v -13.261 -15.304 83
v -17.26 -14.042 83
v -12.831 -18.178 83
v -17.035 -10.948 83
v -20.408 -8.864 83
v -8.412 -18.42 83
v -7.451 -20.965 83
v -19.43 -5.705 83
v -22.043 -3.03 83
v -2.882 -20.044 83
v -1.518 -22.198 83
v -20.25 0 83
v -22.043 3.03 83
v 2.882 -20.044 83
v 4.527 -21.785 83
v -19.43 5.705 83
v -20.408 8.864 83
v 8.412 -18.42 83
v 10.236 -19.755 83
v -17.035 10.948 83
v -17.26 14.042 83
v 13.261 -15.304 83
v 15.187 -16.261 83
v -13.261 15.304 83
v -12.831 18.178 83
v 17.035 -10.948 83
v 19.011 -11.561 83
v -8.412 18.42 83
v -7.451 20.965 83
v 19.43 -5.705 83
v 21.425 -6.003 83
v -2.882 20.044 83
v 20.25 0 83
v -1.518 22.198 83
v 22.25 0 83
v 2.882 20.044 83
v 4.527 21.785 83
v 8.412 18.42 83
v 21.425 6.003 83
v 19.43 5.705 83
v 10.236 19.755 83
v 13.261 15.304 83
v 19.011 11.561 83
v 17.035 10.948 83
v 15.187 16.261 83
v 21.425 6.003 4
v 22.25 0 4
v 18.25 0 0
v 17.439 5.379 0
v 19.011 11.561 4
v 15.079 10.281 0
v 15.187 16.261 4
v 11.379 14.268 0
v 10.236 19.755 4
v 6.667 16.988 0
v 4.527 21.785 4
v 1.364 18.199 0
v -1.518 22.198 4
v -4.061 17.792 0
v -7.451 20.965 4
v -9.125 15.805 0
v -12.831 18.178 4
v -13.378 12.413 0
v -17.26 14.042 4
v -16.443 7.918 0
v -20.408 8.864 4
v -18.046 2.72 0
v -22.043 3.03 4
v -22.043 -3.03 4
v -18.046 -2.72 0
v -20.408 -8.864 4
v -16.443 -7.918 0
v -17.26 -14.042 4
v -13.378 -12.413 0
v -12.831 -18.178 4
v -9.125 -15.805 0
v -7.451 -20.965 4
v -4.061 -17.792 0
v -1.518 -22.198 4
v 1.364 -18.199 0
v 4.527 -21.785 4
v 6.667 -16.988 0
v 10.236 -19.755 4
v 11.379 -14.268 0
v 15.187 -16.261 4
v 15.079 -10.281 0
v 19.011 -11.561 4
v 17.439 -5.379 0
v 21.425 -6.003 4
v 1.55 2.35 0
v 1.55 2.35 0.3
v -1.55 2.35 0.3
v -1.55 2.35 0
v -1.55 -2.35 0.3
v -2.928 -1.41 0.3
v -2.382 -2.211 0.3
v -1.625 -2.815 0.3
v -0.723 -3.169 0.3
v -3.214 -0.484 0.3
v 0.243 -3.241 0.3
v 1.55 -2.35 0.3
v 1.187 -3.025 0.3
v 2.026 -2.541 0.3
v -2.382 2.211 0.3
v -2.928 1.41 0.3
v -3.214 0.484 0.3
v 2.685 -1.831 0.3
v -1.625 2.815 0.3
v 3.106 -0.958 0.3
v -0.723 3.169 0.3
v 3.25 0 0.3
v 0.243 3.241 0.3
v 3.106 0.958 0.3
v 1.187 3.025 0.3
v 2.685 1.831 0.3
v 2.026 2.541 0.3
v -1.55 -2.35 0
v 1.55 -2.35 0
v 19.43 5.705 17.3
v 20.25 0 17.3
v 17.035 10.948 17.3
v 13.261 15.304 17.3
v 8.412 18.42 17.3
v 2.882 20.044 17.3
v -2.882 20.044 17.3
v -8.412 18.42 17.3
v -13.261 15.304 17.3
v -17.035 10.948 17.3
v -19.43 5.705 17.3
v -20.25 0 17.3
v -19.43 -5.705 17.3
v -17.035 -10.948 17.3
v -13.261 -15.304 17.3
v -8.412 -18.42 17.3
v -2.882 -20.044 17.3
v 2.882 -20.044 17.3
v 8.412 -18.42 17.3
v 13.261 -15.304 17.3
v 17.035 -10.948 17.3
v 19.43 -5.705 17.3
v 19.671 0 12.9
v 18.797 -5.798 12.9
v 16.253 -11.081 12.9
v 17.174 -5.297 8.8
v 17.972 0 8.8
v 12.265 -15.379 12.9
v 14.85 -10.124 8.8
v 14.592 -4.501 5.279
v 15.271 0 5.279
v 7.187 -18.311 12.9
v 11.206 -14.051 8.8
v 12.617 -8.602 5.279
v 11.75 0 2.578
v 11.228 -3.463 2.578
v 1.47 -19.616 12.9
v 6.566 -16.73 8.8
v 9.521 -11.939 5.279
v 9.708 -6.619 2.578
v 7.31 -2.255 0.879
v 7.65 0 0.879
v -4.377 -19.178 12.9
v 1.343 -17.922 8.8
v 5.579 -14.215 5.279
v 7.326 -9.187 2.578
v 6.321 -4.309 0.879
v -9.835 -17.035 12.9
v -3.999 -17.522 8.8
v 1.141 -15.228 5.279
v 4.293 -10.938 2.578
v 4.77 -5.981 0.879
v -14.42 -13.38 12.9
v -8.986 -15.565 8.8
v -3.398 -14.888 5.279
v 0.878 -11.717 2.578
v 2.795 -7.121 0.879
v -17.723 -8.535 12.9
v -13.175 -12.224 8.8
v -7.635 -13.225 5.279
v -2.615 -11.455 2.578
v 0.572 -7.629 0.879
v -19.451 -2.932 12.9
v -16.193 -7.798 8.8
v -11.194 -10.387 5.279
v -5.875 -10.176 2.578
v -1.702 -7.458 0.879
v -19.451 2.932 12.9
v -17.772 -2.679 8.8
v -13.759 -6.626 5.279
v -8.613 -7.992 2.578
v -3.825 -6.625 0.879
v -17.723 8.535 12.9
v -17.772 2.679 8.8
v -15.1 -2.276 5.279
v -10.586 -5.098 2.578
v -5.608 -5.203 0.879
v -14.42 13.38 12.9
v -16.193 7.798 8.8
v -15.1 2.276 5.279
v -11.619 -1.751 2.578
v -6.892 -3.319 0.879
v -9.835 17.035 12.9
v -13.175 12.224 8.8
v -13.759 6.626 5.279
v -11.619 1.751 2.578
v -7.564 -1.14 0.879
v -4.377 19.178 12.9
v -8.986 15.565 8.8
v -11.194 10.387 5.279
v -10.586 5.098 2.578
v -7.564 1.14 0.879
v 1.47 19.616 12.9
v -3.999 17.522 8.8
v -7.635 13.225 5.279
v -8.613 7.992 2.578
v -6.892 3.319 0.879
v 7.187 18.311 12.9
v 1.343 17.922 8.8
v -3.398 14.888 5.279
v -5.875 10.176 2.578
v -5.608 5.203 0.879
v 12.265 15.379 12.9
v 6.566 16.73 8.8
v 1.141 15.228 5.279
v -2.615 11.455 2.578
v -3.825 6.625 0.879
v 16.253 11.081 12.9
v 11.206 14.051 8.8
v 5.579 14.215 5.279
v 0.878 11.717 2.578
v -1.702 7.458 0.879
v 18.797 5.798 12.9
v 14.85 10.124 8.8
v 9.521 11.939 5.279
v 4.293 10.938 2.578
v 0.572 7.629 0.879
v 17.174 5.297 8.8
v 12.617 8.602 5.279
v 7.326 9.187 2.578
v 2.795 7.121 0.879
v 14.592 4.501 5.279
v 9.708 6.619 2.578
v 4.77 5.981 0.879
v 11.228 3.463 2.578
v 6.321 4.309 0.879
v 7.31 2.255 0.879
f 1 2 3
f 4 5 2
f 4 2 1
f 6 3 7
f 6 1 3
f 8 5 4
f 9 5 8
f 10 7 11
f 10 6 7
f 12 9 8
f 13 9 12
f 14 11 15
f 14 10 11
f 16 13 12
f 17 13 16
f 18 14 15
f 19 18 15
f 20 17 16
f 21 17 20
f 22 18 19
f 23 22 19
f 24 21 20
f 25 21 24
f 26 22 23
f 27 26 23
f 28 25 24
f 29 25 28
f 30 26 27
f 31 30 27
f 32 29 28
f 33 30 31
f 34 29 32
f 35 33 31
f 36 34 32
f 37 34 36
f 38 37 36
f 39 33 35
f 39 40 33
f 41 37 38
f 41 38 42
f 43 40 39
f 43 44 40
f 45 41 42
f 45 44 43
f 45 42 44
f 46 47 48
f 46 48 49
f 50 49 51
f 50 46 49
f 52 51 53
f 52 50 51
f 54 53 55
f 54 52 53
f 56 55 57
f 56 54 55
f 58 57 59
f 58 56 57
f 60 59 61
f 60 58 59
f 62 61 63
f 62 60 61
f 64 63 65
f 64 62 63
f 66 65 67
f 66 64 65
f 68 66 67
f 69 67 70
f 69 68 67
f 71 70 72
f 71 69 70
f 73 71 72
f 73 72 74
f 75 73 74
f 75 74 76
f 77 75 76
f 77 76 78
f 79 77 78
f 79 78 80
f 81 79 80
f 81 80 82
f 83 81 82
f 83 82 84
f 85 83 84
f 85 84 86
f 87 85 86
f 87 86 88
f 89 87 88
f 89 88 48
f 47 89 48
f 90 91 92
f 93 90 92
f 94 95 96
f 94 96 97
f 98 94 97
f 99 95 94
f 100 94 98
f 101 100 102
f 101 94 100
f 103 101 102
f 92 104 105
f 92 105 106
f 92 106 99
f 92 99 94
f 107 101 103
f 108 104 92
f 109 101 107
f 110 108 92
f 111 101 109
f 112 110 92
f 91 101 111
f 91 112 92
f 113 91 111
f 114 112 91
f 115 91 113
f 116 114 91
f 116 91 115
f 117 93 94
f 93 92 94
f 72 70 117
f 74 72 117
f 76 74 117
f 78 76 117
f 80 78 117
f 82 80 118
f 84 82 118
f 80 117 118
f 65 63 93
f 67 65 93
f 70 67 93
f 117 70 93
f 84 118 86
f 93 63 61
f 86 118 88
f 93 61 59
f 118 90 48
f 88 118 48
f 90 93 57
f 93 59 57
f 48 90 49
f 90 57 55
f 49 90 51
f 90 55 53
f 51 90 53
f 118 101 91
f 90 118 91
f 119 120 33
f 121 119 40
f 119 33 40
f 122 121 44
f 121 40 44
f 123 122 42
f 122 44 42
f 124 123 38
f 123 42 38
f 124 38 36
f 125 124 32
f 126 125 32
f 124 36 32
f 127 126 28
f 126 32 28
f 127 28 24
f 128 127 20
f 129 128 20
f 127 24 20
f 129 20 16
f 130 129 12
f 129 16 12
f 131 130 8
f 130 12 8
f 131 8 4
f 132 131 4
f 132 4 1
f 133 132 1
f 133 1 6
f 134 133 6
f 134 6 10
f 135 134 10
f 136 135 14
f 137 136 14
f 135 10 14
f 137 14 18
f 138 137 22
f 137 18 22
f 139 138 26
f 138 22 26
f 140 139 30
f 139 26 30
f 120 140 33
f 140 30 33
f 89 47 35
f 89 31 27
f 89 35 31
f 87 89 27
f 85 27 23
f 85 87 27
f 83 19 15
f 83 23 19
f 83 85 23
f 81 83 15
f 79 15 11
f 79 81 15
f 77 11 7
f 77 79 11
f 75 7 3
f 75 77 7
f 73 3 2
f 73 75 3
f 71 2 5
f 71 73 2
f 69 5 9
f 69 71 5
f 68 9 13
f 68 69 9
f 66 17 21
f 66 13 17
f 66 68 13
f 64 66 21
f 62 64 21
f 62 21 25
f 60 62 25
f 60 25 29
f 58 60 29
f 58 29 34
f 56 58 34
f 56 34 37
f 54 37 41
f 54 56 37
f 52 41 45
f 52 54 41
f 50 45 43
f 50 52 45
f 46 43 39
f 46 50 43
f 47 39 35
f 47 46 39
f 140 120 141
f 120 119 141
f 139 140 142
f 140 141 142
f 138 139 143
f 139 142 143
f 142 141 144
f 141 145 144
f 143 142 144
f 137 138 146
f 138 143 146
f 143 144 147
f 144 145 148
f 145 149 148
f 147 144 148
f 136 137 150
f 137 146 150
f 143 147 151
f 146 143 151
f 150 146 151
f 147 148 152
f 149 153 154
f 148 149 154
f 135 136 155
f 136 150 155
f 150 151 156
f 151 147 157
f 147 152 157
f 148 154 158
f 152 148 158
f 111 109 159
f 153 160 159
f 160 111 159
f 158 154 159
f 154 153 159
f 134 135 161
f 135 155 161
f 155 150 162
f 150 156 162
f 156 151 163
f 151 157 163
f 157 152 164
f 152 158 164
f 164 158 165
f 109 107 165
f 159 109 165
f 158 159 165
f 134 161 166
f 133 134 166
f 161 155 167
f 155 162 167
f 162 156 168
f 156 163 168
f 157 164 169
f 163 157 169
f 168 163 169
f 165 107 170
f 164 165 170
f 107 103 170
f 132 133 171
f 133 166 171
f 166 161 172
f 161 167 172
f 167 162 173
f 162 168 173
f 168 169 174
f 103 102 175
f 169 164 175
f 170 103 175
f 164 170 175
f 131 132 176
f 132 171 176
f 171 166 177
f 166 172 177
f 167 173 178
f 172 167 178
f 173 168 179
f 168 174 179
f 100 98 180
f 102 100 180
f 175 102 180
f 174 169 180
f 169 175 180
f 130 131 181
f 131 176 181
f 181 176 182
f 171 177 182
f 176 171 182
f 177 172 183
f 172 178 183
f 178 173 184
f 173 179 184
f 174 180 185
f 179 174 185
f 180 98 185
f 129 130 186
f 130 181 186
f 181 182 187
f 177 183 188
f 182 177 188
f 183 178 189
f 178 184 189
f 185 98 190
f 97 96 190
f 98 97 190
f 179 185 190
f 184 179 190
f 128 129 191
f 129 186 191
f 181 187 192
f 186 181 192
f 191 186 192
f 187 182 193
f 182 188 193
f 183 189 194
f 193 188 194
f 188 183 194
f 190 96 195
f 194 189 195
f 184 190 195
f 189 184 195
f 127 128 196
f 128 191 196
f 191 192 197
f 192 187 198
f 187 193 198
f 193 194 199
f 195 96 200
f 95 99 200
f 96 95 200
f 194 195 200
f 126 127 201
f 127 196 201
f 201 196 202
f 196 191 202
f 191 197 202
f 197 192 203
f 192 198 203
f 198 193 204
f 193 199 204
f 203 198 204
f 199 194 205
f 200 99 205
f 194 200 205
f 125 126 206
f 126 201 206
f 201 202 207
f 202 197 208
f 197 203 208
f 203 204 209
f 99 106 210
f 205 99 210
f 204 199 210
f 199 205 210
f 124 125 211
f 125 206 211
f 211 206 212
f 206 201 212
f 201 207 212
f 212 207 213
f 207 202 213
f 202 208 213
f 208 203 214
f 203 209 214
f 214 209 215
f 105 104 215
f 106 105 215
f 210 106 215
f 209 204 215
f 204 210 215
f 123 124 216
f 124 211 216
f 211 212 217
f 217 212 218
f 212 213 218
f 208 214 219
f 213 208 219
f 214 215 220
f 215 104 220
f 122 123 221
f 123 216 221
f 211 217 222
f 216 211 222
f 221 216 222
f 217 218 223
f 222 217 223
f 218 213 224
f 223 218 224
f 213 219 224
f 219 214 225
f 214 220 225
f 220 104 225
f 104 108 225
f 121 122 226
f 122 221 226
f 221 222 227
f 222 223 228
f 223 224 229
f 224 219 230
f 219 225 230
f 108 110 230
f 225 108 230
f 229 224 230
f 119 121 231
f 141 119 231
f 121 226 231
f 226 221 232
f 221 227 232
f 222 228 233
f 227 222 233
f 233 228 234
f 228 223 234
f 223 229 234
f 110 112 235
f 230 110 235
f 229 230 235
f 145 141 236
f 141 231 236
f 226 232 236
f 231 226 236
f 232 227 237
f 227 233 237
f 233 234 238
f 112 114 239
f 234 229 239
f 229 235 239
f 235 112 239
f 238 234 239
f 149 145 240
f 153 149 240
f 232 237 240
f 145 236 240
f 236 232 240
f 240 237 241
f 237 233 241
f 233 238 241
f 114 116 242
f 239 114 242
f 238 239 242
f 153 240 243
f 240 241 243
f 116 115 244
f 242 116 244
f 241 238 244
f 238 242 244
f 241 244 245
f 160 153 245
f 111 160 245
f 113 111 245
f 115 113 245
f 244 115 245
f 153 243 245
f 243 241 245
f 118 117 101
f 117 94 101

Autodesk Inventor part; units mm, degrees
ref_plane "YZ Plane" through (0, 0, 0) normal (1, 0, 0) x (0, 1, 0)
ref_plane "XZ Plane" through (0, 0, 0) normal (0, 1, 0) x (-1, 0, 0)
ref_plane "XY Plane" through (0, 0, 0) normal (0, 0, 1) x (1, 0, 0)
sketch "Sketch2" plane through (0, 0, 0) normal (0, 0, 1) x (1, 0, 0)
  circle A0 centre (0, 0) radius 22.25
  dimension "d2" = 44.5
extrude "Extrusion1" add sketch "Sketch2" along normal blind 83
sketch "Sketch9" plane through (0, 0, 83) normal (0, 0, 1) x (1, 0, 0)
  circle A0 centre (0, 0) radius 22.25 projected
  line L0 (-31.15, 0) -> (31.15, 0) projected
  line L1 (0, -31.15) -> (0, 31.15) projected
  circle A1 centre (0, 0) radius 20.25
  dimension "d54" = 40.5
extrude "Extrusion7" cut sketch "Sketch9" against normal blind 82.7 contours A1 L1 L0 | L0 L1 A1 | L1 L0 A1 | A1 L0 L1
fillet "Fillet12" radius 17 1 edges at (-20.25, 0, 0.3)
sketch "Sketch18" plane through (0, 0, 0.3) normal (0, 0, 1) x (1, 0, 0)
  line L0 (-31.15, 0) -> (31.15, 0) projected
  line L1 (0, -31.15) -> (0, 31.15) projected
  line L2 (1.55, 2.35) -> (-1.55, 2.35)
  line L3 (-1.55, 2.35) -> (-1.55, -2.35)
  line L4 (-1.55, -2.35) -> (1.55, -2.35)
  line L5 (1.55, -2.35) -> (1.55, 2.35)
  line L6 (1.55, 2.35) -> (-1.55, -2.35) construction
  line L7 (-1.55, 2.35) -> (1.55, -2.35) construction
  point P0 (0, 0)
  dimension "d122" = 3.1
  dimension "d123" = 4.7
extrude "Extrusion15" cut sketch "Sketch18" against normal through all
chamfer "Chamfer9" distance 4 angle 45 1 edges at (-22.25, 0, 0)
equation "\"BendRadius\" = Thickness"
equation "\"BendReliefWidth\" = Thickness"
equation "\"BendReliefDepth\" = 0.5 * Thickness"
equation "\"CornerReliefSize\" = 4 * Thickness"
equation "\"MinimumRemnant\" = 2 * Thickness"
equation "\"TransitionRadius\" = BendRadius"
equation "\"JacobiRadiusSize\" = BendRadius"
equation "\"GapSize\" = Thickness"
equation "\"Thickness\" = 3.048"
properties part number "_3DPrint"
